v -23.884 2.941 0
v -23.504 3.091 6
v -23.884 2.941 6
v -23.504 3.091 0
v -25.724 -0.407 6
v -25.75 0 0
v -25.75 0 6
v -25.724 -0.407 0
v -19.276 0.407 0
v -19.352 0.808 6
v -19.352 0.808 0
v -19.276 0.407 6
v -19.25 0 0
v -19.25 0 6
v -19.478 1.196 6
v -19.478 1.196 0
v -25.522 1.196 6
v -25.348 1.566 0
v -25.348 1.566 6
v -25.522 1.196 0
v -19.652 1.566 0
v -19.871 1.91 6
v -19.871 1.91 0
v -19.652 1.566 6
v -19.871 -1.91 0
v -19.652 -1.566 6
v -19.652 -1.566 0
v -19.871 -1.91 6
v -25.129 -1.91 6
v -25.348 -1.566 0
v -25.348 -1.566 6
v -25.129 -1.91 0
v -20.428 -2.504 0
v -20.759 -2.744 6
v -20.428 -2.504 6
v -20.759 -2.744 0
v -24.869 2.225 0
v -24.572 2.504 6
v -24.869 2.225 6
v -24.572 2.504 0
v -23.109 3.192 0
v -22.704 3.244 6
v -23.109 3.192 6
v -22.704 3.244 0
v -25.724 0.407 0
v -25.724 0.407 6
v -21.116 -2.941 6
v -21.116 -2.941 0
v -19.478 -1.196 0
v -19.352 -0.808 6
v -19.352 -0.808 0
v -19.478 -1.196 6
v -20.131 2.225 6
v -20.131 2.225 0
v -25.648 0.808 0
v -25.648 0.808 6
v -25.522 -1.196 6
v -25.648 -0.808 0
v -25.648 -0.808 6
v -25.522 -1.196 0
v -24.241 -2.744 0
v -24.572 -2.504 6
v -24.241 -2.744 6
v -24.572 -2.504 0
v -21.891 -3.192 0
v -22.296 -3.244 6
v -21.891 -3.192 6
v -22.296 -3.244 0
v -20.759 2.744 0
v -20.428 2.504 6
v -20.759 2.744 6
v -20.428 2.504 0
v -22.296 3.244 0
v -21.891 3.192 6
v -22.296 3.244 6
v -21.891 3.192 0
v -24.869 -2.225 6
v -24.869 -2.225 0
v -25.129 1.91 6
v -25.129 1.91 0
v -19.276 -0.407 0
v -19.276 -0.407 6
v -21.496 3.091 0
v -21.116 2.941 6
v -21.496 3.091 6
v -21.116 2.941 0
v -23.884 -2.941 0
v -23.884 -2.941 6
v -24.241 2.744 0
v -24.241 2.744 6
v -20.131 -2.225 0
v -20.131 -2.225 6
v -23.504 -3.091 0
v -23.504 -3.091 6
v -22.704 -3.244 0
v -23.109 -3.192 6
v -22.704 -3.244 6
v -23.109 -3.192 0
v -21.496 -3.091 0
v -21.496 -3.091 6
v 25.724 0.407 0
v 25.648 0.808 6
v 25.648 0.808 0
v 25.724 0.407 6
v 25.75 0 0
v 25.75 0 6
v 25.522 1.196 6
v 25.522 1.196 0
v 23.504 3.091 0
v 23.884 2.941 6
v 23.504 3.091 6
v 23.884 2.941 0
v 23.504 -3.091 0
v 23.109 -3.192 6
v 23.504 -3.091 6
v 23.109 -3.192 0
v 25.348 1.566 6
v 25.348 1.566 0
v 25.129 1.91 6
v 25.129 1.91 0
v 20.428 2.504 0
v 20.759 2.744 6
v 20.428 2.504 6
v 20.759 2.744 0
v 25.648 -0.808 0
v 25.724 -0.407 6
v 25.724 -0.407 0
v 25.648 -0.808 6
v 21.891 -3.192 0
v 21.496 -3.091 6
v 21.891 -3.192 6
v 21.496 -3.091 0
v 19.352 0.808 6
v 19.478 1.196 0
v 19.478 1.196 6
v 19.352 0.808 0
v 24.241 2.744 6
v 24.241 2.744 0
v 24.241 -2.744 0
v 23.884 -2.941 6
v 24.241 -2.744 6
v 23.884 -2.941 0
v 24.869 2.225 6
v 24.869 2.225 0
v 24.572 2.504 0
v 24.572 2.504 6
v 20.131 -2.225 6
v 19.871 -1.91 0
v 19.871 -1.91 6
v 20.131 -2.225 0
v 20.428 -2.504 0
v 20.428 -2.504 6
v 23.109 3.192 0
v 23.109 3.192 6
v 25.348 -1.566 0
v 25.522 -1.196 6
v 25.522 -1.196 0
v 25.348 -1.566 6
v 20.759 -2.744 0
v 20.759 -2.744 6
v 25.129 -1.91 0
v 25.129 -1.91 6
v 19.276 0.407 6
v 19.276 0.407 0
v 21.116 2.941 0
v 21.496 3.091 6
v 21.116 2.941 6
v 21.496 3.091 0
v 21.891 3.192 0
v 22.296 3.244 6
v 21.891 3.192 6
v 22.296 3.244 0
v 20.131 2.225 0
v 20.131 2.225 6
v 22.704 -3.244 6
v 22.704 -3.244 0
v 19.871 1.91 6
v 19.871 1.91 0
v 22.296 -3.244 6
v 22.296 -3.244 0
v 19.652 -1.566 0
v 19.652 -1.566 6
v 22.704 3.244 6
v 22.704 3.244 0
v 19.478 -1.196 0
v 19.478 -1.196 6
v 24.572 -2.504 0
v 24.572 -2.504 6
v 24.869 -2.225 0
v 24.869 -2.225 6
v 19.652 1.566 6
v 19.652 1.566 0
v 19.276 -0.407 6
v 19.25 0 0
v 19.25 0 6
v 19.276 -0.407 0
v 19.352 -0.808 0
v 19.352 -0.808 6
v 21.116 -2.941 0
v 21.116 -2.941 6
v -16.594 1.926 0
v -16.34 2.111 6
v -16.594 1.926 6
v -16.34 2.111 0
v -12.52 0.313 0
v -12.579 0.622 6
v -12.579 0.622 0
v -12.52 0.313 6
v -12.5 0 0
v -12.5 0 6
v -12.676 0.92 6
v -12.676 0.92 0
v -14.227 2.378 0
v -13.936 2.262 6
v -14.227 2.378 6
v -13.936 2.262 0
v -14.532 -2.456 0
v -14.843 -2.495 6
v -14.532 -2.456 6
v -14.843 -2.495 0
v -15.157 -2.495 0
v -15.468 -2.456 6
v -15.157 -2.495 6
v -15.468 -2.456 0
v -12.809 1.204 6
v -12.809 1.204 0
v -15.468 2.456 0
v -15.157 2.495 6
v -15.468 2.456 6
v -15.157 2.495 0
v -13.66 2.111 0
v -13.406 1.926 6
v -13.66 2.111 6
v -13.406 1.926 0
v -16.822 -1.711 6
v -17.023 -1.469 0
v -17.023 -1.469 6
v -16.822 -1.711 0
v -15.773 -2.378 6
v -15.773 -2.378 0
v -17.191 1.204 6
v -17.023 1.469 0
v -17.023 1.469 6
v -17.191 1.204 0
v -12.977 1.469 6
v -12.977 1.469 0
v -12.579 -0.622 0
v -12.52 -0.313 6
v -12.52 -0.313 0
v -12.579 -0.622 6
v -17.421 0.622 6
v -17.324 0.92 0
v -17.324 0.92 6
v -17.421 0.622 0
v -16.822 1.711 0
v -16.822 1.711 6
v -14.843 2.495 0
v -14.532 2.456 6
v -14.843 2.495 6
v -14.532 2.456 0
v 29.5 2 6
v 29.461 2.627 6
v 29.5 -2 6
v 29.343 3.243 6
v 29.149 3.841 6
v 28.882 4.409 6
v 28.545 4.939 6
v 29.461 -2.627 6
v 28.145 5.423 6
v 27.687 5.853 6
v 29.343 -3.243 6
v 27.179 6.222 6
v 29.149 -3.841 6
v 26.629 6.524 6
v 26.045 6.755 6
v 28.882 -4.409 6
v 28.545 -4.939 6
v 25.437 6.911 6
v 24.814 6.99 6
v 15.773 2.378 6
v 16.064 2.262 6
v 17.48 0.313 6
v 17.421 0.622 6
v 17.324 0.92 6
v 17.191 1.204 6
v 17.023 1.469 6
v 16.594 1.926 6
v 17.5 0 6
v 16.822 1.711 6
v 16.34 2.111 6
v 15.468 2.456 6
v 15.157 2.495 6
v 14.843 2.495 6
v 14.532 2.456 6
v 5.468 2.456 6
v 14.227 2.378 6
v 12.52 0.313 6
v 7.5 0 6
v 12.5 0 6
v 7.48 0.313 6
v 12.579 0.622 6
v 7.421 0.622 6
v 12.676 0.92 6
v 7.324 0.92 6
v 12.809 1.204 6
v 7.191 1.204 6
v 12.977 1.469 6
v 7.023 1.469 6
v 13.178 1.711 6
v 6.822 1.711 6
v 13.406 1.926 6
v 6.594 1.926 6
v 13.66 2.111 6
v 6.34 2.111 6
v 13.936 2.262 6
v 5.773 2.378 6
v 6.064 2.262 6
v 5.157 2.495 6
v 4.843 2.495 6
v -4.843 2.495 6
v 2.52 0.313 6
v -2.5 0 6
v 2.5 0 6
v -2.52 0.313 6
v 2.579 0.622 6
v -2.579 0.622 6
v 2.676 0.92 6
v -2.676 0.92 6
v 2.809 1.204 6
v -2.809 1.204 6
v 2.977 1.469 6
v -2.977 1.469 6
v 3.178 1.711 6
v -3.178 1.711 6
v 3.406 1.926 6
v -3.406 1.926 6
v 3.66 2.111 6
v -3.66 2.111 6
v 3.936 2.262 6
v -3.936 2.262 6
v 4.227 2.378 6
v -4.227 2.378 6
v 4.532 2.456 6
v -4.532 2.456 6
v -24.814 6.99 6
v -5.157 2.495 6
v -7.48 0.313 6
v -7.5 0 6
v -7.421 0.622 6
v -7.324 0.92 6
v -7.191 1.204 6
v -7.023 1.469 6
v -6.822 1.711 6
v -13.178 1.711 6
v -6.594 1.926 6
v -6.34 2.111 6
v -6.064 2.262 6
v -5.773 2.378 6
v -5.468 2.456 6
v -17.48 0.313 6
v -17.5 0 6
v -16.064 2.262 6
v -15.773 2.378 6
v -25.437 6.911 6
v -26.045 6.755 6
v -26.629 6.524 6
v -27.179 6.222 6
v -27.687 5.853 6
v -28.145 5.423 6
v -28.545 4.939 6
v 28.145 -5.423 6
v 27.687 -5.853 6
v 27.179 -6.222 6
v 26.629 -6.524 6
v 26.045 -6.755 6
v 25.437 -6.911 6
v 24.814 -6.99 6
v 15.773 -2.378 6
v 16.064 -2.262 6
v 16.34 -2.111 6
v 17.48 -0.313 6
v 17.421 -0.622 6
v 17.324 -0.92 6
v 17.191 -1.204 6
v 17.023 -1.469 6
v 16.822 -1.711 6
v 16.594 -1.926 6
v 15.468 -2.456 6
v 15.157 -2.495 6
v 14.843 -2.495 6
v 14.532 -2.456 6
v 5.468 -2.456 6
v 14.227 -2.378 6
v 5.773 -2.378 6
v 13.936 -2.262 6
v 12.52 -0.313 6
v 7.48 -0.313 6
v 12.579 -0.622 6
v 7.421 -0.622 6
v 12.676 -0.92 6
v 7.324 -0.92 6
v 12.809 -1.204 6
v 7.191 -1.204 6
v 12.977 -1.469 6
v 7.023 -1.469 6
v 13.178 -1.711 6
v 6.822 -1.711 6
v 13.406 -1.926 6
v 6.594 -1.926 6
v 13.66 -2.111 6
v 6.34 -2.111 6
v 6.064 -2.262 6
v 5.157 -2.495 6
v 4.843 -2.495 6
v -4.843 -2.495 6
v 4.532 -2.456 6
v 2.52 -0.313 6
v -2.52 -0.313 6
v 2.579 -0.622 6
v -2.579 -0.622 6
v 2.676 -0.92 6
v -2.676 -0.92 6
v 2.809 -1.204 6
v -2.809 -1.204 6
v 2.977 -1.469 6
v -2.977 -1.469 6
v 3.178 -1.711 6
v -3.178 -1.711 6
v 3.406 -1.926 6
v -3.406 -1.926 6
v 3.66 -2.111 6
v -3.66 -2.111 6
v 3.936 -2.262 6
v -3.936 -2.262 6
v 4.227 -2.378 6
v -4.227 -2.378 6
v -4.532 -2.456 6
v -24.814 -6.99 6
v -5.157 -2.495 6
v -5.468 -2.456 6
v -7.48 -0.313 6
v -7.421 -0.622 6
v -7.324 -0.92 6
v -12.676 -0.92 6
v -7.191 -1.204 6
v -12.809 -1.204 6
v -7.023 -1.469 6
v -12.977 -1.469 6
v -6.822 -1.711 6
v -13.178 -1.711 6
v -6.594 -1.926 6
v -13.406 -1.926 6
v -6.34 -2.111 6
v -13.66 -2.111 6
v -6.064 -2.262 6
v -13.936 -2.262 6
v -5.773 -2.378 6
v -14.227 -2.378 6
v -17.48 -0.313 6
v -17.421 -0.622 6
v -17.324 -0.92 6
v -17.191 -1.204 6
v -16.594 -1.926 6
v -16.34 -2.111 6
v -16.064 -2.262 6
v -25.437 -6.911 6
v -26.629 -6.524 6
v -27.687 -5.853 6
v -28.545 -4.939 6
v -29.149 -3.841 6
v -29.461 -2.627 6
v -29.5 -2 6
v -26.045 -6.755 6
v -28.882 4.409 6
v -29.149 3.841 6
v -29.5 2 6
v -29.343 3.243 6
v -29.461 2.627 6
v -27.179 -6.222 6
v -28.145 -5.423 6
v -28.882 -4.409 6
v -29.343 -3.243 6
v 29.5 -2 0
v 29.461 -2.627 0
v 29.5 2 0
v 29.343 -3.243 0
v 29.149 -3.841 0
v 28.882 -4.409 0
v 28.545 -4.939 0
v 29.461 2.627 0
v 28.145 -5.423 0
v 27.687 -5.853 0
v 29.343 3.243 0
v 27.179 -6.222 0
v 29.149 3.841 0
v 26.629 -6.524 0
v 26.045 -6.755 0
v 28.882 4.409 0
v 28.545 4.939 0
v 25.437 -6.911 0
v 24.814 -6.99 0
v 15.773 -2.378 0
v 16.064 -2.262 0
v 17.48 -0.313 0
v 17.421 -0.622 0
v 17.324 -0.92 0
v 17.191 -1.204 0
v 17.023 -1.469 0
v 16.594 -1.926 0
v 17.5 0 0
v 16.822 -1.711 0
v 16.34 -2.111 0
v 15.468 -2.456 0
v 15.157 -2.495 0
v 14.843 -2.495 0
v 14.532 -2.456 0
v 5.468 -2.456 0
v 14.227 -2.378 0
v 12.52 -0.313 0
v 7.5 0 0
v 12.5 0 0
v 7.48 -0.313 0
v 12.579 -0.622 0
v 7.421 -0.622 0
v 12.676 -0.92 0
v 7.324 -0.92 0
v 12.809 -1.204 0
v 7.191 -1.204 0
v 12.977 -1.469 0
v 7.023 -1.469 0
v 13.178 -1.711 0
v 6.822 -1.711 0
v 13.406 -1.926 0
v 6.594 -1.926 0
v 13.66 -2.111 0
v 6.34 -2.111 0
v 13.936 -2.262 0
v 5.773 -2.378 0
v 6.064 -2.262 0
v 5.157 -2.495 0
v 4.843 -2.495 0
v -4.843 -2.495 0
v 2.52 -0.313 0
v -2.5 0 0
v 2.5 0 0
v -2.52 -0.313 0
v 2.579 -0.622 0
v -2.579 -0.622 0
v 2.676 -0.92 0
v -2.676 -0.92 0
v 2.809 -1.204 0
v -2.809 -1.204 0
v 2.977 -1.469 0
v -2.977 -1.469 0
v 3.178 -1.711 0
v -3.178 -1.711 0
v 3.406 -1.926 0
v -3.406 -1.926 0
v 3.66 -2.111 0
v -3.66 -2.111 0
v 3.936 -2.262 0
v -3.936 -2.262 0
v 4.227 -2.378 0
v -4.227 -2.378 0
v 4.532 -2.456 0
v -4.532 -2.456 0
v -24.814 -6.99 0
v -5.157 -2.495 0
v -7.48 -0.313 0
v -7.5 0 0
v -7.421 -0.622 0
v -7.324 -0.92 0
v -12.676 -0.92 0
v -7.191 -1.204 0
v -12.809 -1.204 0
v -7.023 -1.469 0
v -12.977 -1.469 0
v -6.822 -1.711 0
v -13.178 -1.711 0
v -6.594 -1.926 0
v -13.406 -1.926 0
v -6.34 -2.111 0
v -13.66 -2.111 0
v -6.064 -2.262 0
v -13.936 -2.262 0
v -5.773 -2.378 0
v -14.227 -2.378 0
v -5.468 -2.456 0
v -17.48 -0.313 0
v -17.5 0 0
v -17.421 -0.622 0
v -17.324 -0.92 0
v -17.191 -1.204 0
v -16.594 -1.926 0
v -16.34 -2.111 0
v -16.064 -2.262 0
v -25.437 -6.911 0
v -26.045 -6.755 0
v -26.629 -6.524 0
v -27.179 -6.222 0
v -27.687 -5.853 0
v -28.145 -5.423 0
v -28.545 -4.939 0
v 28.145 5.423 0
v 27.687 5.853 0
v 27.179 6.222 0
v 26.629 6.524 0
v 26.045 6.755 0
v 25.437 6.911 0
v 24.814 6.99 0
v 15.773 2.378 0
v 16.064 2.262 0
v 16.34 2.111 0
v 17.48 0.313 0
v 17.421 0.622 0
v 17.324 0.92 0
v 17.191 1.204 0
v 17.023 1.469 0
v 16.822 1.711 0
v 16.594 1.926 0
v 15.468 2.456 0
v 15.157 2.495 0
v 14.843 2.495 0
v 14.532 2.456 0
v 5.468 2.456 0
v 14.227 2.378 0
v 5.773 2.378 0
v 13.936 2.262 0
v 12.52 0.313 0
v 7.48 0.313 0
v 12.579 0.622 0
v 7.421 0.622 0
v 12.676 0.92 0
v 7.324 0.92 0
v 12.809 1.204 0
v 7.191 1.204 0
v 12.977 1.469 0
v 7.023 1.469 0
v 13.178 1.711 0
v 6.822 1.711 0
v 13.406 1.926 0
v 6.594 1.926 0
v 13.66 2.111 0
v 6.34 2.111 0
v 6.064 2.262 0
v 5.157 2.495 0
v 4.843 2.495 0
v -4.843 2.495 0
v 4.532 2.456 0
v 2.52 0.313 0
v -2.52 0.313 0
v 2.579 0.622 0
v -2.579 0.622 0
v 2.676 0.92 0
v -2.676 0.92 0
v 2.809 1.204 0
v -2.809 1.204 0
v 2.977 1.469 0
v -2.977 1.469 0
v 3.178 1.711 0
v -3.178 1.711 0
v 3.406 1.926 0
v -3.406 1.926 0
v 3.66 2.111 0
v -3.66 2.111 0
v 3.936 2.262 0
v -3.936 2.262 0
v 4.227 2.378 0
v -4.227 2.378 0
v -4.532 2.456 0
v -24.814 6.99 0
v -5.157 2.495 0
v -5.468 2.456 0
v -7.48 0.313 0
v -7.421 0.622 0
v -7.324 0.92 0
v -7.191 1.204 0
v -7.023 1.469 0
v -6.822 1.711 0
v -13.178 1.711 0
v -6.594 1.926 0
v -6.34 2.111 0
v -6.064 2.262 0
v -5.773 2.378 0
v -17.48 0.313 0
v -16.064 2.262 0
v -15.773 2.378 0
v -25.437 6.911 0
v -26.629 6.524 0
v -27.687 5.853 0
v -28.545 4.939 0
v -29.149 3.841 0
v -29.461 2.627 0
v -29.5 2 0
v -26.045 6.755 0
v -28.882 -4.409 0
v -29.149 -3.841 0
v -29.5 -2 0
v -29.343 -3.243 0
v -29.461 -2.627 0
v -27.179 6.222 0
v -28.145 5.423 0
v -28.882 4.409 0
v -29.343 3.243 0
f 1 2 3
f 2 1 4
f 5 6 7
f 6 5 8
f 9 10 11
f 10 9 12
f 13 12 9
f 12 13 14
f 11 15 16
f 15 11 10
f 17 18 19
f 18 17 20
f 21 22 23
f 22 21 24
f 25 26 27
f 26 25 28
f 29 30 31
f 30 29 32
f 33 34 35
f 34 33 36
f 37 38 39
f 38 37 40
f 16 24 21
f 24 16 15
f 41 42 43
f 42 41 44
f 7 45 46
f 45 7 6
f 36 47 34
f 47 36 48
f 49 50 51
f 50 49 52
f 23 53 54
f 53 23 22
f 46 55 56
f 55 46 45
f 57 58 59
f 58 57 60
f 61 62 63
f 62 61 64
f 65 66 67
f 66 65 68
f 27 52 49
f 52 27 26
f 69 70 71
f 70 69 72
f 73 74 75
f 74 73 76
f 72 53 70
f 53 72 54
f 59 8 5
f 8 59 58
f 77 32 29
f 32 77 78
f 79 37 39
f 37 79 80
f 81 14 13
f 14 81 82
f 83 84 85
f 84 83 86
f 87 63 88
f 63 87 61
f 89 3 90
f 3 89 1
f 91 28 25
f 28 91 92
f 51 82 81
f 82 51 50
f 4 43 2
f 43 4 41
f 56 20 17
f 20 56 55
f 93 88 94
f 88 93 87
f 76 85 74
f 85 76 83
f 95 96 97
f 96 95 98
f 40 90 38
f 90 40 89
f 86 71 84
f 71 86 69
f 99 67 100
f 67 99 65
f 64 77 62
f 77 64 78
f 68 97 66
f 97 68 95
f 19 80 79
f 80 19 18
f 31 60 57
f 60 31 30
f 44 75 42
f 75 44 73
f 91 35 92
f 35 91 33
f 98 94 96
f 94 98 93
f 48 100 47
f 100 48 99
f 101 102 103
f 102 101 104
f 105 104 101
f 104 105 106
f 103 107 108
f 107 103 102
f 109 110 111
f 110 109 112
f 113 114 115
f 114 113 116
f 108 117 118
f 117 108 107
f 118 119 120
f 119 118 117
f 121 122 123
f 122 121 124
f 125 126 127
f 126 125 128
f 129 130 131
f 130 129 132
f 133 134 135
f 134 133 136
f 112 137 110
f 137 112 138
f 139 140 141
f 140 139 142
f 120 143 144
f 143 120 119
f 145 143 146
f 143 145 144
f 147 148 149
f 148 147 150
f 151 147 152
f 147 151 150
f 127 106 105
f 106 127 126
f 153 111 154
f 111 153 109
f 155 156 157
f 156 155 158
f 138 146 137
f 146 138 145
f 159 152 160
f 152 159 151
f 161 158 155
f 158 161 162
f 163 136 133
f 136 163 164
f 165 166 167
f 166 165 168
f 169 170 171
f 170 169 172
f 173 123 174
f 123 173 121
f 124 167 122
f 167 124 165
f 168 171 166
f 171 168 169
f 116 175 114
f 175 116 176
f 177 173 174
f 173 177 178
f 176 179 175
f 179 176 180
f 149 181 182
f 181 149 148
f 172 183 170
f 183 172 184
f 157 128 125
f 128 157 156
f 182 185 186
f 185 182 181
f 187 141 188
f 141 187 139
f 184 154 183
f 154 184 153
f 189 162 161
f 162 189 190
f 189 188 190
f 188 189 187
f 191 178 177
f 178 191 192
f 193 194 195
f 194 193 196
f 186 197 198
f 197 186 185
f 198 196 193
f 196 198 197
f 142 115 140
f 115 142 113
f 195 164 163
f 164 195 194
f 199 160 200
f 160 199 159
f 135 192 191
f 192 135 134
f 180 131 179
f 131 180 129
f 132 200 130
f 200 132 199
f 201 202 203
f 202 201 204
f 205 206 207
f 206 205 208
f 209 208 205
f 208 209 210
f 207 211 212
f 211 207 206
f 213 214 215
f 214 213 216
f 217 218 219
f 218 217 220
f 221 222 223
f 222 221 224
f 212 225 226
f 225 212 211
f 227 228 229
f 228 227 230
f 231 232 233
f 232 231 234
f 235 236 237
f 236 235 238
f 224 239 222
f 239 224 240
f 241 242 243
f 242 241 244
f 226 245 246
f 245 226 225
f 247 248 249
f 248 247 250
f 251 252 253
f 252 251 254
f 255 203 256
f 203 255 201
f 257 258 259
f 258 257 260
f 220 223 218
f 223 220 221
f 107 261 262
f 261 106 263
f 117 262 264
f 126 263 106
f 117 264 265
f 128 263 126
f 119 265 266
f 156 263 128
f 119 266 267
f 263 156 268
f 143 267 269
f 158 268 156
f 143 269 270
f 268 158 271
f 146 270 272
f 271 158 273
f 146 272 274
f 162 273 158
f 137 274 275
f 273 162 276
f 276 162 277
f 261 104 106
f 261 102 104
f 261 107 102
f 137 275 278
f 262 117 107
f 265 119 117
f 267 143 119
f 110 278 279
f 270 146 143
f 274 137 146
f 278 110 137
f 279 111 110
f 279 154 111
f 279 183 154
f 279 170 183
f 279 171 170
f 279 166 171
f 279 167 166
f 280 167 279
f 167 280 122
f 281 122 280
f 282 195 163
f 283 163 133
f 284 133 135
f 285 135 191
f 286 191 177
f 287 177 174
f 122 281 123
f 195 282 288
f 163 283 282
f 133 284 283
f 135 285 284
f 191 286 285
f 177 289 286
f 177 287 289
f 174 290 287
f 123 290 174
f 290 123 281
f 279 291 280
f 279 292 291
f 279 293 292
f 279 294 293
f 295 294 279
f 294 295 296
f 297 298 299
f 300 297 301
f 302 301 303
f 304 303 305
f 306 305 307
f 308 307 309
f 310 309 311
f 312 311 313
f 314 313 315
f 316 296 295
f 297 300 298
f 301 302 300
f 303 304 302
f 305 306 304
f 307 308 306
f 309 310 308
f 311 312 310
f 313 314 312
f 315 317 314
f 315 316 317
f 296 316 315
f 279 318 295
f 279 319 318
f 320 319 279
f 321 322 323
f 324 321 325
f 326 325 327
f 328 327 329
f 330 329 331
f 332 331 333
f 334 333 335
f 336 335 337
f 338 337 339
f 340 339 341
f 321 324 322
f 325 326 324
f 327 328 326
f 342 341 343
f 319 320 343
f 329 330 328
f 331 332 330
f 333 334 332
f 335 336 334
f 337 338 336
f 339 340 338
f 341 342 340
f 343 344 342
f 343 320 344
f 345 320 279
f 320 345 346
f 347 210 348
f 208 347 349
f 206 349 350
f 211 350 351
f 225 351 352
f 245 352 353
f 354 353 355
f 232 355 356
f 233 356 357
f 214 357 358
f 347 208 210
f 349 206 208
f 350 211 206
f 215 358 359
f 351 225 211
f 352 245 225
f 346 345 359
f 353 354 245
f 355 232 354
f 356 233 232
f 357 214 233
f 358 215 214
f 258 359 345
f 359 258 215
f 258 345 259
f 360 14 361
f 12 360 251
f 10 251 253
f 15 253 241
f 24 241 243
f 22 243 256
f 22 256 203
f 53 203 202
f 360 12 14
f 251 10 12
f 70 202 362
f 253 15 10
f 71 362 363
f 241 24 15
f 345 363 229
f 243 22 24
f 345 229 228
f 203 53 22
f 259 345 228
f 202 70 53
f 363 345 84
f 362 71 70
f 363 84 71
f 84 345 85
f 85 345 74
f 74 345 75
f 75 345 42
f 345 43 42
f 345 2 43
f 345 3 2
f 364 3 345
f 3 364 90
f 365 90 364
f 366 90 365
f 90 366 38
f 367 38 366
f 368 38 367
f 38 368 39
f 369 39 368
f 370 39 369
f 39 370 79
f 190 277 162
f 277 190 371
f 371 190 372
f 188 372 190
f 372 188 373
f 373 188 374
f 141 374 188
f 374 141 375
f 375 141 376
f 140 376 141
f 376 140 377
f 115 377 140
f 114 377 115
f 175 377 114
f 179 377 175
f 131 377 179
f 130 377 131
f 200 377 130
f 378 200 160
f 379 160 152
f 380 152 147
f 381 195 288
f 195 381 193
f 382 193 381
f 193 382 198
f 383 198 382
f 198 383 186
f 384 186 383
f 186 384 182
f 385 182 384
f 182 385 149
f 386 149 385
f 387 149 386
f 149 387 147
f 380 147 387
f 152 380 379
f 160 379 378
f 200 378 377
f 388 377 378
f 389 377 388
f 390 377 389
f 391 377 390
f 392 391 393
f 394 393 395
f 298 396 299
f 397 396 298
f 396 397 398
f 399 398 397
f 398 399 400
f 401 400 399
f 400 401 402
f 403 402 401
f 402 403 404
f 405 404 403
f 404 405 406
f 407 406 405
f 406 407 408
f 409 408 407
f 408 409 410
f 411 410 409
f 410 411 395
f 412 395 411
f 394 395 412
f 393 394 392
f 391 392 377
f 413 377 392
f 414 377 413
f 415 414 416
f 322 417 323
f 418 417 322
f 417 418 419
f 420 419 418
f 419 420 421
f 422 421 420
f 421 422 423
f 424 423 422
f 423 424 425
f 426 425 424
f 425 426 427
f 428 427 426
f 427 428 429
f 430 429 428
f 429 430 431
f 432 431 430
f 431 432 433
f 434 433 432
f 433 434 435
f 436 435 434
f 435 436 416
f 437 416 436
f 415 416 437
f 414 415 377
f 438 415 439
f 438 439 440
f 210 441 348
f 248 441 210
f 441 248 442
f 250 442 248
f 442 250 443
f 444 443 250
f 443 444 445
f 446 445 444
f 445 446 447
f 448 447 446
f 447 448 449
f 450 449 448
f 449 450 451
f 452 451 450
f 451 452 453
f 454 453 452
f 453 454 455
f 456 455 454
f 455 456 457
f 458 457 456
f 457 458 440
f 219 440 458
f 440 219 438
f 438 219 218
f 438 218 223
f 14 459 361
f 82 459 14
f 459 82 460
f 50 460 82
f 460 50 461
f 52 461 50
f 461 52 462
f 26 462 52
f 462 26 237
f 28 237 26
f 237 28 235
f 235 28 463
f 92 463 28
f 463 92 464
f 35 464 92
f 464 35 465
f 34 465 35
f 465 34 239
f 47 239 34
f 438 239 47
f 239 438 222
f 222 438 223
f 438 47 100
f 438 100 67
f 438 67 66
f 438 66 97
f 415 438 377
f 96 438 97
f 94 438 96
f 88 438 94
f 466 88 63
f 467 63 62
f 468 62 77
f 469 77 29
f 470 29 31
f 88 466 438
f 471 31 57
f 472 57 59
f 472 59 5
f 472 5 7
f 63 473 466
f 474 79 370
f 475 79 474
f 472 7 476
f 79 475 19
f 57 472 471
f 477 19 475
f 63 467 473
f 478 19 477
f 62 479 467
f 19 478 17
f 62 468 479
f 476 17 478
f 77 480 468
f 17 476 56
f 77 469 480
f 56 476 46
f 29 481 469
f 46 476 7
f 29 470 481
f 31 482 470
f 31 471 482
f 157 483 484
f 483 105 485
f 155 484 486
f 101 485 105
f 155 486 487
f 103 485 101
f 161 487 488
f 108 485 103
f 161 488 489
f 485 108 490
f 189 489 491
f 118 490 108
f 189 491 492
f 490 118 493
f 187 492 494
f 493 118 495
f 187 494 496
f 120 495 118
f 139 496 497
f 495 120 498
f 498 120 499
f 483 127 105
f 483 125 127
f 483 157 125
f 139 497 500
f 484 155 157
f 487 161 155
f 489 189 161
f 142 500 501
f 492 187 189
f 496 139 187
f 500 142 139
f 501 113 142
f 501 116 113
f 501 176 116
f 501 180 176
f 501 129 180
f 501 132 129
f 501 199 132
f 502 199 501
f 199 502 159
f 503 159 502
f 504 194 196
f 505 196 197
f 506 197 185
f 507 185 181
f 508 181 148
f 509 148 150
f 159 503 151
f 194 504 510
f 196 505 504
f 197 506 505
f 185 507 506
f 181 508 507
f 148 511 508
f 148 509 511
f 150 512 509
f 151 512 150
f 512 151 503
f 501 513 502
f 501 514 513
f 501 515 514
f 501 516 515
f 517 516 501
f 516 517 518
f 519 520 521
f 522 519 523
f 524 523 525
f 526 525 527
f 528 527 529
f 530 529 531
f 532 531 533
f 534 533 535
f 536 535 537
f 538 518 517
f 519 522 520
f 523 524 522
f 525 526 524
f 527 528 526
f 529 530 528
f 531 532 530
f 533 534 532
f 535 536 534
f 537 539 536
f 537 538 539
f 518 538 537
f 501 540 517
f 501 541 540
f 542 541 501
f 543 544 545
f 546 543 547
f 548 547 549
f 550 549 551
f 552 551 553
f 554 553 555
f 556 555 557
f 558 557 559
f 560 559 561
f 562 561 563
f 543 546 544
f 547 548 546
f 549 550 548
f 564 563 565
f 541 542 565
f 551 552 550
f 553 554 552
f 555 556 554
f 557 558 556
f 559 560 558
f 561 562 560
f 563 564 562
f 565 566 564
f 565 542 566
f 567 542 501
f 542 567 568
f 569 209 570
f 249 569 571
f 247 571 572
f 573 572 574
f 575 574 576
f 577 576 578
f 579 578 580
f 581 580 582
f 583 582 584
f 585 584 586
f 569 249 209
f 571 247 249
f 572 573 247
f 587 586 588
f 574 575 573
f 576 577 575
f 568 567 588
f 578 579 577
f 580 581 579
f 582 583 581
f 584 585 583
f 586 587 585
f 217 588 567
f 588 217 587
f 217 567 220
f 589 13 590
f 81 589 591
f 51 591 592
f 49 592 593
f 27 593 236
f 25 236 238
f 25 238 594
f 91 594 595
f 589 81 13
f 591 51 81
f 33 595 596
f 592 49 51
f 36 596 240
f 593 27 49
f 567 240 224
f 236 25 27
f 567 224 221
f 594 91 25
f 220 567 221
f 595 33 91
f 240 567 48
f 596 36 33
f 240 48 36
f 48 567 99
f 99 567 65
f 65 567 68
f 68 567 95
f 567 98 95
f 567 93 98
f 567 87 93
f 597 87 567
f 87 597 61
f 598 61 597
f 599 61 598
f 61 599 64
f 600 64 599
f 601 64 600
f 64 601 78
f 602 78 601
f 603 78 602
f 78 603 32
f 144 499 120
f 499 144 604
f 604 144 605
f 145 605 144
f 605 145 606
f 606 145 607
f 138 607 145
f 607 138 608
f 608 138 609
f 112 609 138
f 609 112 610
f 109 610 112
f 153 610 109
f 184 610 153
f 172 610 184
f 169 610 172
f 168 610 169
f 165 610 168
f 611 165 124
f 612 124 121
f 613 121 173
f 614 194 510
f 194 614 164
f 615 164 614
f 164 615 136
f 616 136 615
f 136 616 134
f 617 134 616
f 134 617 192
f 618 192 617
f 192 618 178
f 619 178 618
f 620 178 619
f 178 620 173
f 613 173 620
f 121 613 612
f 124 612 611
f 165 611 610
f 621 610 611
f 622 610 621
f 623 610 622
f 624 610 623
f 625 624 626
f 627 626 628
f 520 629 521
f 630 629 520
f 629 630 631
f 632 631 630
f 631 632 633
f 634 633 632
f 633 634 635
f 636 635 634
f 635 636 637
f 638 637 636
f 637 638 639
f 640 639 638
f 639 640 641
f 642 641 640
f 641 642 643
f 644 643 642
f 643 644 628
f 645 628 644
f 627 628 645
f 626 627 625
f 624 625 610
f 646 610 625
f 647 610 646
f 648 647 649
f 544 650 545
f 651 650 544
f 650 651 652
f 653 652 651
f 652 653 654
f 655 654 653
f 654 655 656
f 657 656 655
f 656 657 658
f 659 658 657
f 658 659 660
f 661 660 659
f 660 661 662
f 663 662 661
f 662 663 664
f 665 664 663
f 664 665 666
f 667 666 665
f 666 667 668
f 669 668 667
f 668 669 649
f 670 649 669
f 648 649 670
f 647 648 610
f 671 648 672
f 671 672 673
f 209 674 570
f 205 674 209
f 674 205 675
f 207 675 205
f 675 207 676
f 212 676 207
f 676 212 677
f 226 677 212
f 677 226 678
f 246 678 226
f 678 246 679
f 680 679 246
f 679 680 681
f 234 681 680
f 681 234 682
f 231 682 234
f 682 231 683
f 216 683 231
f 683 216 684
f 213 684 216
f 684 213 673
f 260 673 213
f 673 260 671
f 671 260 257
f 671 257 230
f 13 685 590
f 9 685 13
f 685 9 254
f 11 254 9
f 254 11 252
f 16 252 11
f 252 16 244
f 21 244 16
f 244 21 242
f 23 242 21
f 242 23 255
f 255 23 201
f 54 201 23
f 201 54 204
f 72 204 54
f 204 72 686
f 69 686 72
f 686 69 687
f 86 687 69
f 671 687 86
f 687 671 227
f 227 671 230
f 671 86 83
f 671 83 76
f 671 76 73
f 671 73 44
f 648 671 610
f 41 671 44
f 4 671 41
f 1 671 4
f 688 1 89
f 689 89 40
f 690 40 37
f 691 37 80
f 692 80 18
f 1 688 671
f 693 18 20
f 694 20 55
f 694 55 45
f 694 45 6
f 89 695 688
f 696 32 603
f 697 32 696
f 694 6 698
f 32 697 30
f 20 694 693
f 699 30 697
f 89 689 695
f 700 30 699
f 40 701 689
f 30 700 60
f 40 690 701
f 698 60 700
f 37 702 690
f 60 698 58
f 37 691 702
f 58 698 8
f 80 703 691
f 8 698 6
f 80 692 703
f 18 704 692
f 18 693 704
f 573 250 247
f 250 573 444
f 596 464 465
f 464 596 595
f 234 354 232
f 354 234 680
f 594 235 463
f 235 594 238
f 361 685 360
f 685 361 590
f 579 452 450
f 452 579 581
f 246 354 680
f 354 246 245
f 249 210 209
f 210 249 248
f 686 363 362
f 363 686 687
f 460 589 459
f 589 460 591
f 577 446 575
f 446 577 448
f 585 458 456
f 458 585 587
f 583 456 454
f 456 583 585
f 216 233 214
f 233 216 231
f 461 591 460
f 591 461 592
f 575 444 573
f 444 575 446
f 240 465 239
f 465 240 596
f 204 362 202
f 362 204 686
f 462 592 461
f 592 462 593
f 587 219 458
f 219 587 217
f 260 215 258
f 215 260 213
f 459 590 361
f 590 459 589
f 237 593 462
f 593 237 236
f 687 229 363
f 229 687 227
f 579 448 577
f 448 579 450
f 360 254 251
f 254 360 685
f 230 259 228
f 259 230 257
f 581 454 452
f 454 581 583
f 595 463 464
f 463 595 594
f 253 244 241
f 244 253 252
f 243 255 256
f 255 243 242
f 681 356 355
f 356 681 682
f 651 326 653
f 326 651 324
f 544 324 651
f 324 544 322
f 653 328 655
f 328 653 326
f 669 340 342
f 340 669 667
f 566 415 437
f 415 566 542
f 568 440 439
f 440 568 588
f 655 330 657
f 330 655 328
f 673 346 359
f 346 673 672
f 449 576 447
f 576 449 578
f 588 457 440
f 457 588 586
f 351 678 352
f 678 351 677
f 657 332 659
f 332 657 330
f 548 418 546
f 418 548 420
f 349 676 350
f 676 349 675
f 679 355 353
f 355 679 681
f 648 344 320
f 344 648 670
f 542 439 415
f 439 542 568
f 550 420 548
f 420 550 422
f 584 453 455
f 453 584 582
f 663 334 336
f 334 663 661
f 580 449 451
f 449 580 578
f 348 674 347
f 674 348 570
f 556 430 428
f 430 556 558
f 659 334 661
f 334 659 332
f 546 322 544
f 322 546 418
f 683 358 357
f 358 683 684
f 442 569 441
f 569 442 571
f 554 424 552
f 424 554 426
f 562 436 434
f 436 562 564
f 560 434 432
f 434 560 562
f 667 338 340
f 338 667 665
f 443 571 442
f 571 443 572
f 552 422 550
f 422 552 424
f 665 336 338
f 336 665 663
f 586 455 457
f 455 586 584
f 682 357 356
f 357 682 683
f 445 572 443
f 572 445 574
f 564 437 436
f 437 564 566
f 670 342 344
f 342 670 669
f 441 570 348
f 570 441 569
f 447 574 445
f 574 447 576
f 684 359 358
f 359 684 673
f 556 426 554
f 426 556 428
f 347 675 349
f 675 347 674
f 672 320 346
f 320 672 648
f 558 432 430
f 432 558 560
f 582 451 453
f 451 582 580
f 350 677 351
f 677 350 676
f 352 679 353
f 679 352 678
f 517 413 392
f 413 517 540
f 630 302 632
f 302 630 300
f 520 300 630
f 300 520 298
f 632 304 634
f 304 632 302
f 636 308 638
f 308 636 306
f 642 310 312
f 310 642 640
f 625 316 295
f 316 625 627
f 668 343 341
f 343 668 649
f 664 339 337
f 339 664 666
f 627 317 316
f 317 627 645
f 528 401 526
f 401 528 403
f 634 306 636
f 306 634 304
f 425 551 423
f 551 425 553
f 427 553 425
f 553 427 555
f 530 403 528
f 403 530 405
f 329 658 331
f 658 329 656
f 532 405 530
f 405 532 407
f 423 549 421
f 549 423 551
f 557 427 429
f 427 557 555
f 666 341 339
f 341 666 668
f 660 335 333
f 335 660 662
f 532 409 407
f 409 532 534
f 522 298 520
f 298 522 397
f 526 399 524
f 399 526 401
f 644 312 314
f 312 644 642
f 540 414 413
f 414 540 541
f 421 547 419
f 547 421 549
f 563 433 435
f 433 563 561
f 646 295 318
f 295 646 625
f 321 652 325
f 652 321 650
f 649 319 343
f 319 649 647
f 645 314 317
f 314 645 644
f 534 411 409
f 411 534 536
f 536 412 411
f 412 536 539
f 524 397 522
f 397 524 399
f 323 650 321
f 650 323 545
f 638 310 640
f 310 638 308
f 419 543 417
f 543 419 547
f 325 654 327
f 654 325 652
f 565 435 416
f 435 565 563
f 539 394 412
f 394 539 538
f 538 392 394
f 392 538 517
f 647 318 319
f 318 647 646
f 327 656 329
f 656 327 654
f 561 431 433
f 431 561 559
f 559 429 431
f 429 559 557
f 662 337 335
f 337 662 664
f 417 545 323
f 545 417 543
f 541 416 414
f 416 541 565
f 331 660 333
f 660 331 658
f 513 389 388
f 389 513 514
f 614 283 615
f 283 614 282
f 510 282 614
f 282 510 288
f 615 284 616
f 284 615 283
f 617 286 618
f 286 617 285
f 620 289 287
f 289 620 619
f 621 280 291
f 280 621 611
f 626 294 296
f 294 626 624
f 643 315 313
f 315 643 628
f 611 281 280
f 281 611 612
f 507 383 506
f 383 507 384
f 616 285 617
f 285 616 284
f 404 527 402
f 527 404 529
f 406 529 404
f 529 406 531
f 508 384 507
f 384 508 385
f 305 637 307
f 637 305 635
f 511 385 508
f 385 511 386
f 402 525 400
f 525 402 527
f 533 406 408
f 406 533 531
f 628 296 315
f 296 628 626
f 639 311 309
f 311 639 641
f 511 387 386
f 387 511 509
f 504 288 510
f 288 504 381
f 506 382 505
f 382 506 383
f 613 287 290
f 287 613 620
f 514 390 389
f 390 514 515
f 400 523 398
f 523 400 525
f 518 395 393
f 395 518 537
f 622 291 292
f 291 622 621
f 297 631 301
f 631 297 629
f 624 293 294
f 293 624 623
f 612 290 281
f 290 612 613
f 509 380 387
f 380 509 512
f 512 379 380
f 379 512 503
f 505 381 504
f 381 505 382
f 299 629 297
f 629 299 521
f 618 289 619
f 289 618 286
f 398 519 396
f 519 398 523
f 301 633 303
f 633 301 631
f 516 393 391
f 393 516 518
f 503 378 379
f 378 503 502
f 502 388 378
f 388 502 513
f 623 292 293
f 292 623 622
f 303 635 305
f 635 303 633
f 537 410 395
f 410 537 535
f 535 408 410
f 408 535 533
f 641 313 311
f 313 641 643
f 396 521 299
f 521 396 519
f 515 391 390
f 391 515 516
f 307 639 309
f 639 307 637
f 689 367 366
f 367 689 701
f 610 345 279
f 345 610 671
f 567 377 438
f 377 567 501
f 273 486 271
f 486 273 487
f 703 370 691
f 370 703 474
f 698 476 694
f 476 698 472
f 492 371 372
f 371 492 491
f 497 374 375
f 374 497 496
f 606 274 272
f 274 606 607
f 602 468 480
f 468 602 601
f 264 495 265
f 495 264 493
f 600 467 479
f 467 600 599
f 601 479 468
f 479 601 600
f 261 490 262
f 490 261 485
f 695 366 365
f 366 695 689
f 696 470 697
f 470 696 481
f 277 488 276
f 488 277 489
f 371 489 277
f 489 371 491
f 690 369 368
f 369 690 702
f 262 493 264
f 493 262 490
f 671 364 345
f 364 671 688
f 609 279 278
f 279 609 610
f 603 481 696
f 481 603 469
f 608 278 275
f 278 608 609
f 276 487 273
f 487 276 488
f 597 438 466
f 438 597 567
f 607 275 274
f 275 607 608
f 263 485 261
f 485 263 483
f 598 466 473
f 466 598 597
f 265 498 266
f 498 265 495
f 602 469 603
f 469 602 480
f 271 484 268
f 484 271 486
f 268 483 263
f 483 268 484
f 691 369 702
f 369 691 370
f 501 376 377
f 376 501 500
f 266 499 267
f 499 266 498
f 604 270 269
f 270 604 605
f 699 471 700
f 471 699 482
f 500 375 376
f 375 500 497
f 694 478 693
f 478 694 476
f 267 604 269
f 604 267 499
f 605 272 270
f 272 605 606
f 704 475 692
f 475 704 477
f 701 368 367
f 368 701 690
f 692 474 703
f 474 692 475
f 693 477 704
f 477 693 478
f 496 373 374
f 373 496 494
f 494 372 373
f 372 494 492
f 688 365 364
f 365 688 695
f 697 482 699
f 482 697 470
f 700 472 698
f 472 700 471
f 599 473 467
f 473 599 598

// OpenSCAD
$fn = 50;


difference() {
	union() {
		hull() {
			translate(v = [-24.5000000000, 2.0000000000, 0]) {
				cylinder(h = 6, r = 5);
			}
			translate(v = [24.5000000000, 2.0000000000, 0]) {
				cylinder(h = 6, r = 5);
			}
			translate(v = [-24.5000000000, -2.0000000000, 0]) {
				cylinder(h = 6, r = 5);
			}
			translate(v = [24.5000000000, -2.0000000000, 0]) {
				cylinder(h = 6, r = 5);
			}
		}
	}
	union() {
		#translate(v = [-22.5000000000, 0.0000000000, 0]) {
			cylinder(h = 6, r = 3.2500000000);
		}
		#translate(v = [22.5000000000, 0.0000000000, 0]) {
			cylinder(h = 6, r = 3.2500000000);
		}
		#translate(v = [-22.5000000000, 0.0000000000, -100.0000000000]) {
			cylinder(h = 200, r = 3.2500000000);
		}
		#translate(v = [-22.5000000000, 0.0000000000, -100.0000000000]) {
			cylinder(h = 200, r = 3.2500000000);
		}
		#translate(v = [22.5000000000, 0.0000000000, -100.0000000000]) {
			cylinder(h = 200, r = 3.2500000000);
		}
		#translate(v = [22.5000000000, 0.0000000000, -100.0000000000]) {
			cylinder(h = 200, r = 3.2500000000);
		}
		#translate(v = [-22.5000000000, 0.0000000000, 0]) {
			cylinder(h = 6, r = 1.8000000000);
		}
		#translate(v = [22.5000000000, 0.0000000000, 0]) {
			cylinder(h = 6, r = 1.8000000000);
		}
		#translate(v = [-22.5000000000, 0.0000000000, 0]) {
			cylinder(h = 6, r = 1.8000000000);
		}
		#translate(v = [22.5000000000, 0.0000000000, 0]) {
			cylinder(h = 6, r = 1.8000000000);
		}
		#translate(v = [-22.5000000000, 0.0000000000, 0]) {
			cylinder(h = 6, r = 1.8000000000);
		}
		#translate(v = [22.5000000000, 0.0000000000, 0]) {
			cylinder(h = 6, r = 1.8000000000);
		}
		#translate(v = [-15.0000000000, 0, 0]) {
			cylinder(h = 6, r = 2.5000000000);
		}
		#translate(v = [-5.0000000000, 0, 0]) {
			cylinder(h = 6, r = 2.5000000000);
		}
		#translate(v = [5.0000000000, 0, 0]) {
			cylinder(h = 6, r = 2.5000000000);
		}
		#translate(v = [15.0000000000, 0, 0]) {
			cylinder(h = 6, r = 2.5000000000);
		}
	}
}
